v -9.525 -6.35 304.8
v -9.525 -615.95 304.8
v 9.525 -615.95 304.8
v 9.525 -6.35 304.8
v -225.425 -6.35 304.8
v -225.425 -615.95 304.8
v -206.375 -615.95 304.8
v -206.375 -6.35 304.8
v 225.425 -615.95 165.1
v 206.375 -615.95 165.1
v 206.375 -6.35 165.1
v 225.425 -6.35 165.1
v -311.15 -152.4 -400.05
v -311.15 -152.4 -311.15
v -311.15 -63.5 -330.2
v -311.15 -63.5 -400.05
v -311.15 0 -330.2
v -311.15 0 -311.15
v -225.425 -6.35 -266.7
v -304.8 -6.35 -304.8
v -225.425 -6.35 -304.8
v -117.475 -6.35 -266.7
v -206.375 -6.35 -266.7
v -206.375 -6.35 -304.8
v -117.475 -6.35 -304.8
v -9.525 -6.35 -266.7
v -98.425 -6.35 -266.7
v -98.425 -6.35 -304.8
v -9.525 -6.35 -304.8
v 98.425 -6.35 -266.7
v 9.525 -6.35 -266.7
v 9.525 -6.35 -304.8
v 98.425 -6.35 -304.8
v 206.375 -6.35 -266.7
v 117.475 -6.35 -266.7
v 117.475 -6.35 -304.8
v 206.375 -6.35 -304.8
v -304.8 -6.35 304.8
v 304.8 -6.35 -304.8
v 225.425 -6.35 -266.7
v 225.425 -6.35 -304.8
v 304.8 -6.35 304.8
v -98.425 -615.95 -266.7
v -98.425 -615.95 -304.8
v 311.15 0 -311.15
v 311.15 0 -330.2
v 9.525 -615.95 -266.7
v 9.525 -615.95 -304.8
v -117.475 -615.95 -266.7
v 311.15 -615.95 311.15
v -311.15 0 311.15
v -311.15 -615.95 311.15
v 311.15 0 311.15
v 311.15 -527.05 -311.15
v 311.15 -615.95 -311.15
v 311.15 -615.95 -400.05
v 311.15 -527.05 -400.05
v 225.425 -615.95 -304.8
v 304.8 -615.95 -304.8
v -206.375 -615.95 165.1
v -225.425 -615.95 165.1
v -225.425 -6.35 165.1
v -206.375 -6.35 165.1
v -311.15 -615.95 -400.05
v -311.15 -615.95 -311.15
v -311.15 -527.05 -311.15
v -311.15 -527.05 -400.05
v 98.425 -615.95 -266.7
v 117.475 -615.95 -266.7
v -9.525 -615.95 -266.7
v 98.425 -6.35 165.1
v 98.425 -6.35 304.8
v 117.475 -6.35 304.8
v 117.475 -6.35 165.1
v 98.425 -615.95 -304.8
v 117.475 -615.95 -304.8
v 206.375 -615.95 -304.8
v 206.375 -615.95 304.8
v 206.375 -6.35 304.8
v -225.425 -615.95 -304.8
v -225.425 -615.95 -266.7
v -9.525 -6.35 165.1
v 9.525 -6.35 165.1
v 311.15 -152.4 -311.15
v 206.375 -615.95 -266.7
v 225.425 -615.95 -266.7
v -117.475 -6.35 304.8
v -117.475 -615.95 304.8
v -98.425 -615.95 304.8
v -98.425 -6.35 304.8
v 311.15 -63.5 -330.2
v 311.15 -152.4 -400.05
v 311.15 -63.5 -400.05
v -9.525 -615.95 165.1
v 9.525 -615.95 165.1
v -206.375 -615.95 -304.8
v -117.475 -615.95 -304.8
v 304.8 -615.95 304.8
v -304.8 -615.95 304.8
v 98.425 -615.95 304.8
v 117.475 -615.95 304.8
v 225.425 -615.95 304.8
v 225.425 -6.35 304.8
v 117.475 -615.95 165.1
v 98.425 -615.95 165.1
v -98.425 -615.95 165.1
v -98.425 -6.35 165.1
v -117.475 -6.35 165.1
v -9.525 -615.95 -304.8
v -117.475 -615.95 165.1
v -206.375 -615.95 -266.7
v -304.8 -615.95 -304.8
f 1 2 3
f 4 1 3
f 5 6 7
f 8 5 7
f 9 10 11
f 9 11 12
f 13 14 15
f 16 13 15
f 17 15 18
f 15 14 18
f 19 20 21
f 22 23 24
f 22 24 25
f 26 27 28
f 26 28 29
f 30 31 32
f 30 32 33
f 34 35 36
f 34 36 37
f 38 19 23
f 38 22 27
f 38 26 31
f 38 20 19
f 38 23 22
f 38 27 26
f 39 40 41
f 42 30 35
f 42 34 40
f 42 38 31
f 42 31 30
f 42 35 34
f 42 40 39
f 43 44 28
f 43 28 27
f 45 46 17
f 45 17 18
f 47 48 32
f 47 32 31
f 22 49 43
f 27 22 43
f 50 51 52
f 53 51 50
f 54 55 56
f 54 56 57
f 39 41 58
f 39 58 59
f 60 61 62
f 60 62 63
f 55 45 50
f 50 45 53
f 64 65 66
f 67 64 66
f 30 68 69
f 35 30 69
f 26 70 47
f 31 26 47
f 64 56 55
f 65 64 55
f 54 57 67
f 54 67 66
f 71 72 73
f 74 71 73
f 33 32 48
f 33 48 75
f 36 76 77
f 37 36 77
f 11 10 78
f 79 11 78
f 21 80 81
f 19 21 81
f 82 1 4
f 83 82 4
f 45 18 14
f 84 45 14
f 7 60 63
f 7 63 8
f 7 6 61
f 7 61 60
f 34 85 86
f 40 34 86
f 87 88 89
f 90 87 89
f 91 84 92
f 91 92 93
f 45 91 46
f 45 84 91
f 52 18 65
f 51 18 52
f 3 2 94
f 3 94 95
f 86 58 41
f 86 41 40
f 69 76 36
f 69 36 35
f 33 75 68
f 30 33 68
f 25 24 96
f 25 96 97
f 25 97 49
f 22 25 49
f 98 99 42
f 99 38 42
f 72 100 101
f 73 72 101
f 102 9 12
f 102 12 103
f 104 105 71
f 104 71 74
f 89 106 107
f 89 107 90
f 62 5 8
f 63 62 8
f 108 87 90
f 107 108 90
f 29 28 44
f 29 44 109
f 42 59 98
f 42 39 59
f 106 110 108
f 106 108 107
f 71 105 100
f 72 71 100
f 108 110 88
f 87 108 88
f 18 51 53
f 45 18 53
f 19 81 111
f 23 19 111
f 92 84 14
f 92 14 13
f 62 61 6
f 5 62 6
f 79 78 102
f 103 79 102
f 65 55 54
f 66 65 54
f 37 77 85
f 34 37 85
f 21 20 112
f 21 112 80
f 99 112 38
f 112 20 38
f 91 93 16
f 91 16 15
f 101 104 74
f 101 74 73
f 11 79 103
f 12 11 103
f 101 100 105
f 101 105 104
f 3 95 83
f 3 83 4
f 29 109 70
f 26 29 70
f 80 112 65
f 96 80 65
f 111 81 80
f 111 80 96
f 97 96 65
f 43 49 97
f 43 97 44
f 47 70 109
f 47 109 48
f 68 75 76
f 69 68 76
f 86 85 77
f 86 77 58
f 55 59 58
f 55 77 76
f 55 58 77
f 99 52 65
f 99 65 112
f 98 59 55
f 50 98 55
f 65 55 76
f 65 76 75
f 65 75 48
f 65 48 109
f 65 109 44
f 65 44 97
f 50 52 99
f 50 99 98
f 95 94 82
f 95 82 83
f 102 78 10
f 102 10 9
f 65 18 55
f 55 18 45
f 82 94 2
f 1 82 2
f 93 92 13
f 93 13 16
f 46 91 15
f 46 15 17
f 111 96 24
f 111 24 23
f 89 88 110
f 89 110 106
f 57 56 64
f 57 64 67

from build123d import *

# Parameters (mm, degrees)
F0_W     = 622.3
F0_H     = 622.3
F1_DEPTH = 615.95
F2_T     = -6.35
F3_W     = 88.9
F3_H     = 88.9
F4_DEPTH = 622.3
F3_W_2   = 63.5
F3_H_2   = 19.05
F5_W     = 19.05
F5_H     = 38.1
F6_DEPTH = 609.6
F7_W     = 19.05
F7_H     = 139.7
F8_DEPTH = 609.6


with BuildPart() as f1:
    # F0 (on Front) → F1 (new body)
    with BuildSketch(Plane.XZ):
        Rectangle(F0_W, F0_H)
    extrude(amount=F1_DEPTH)

    # F2
    f2_openings = [f1.faces().sort_by_distance(p)[0] for p in [
        (0, -615.95, 0),
    ]]
    offset(amount=F2_T, openings=f2_openings)

    # F5 (on face) → F6 (join)
    with BuildSketch(Plane.XZ.offset(615.95)):
        with Locations((-215.9, -285.75)):
            Rectangle(F5_W, F5_H)
        with Locations((-107.95, -285.75)):
            Rectangle(F5_W, F5_H)
        with Locations((0, -285.75)):
            Rectangle(F5_W, F5_H)
        with Locations((107.95, -285.75)):
            Rectangle(F5_W, F5_H)
        with Locations((215.9, -285.75)):
            Rectangle(F5_W, F5_H)
    extrude(amount=-F6_DEPTH)


with BuildPart() as f4:
    # F3 (on face) → F4 (new body)
    with BuildSketch(Plane.YZ.offset(311.15)):
        with Locations((-571.5, -355.6)):
            Rectangle(F3_W, F3_H)
    extrude(amount=-F4_DEPTH)


with BuildPart() as f4b:
    # F3 (on face) → F4, piece 2 (new body)
    with BuildSketch(Plane.YZ.offset(311.15)):
        Polygon((-63.5, -311.15), (-152.4, -311.15), (-152.4, -400.05), (-63.5, -400.05), (-63.5, -330.2), align=None)
        with Locations((-31.75, -320.675)):
            Rectangle(F3_W_2, F3_H_2)
    extrude(amount=-F4_DEPTH)


with BuildPart() as f8:
    # F7 (on face) → F8 (new body)
    with BuildSketch(Plane.XZ.offset(615.95)):
        with Locations((-215.9, 234.95)):
            Rectangle(F7_W, F7_H)
    extrude(amount=-F8_DEPTH)


with BuildPart() as f8b:
    # F7 (on face) → F8, piece 2 (new body)
    with BuildSketch(Plane.XZ.offset(615.95)):
        with Locations((-107.95, 234.95)):
            Rectangle(F7_W, F7_H)
    extrude(amount=-F8_DEPTH)


with BuildPart() as f8c:
    # F7 (on face) → F8, piece 3 (new body)
    with BuildSketch(Plane.XZ.offset(615.95)):
        with Locations((0, 234.95)):
            Rectangle(F7_W, F7_H)
    extrude(amount=-F8_DEPTH)


with BuildPart() as f8d:
    # F7 (on face) → F8, piece 4 (new body)
    with BuildSketch(Plane.XZ.offset(615.95)):
        with Locations((107.95, 234.95)):
            Rectangle(F7_W, F7_H)
    extrude(amount=-F8_DEPTH)


with BuildPart() as f8e:
    # F7 (on face) → F8, piece 5 (new body)
    with BuildSketch(Plane.XZ.offset(615.95)):
        with Locations((215.9, 234.95)):
            Rectangle(F7_W, F7_H)
    extrude(amount=-F8_DEPTH)


solid = Compound([f1.part, f4.part, f4b.part, f8.part, f8b.part, f8c.part, f8d.part, f8e.part])
